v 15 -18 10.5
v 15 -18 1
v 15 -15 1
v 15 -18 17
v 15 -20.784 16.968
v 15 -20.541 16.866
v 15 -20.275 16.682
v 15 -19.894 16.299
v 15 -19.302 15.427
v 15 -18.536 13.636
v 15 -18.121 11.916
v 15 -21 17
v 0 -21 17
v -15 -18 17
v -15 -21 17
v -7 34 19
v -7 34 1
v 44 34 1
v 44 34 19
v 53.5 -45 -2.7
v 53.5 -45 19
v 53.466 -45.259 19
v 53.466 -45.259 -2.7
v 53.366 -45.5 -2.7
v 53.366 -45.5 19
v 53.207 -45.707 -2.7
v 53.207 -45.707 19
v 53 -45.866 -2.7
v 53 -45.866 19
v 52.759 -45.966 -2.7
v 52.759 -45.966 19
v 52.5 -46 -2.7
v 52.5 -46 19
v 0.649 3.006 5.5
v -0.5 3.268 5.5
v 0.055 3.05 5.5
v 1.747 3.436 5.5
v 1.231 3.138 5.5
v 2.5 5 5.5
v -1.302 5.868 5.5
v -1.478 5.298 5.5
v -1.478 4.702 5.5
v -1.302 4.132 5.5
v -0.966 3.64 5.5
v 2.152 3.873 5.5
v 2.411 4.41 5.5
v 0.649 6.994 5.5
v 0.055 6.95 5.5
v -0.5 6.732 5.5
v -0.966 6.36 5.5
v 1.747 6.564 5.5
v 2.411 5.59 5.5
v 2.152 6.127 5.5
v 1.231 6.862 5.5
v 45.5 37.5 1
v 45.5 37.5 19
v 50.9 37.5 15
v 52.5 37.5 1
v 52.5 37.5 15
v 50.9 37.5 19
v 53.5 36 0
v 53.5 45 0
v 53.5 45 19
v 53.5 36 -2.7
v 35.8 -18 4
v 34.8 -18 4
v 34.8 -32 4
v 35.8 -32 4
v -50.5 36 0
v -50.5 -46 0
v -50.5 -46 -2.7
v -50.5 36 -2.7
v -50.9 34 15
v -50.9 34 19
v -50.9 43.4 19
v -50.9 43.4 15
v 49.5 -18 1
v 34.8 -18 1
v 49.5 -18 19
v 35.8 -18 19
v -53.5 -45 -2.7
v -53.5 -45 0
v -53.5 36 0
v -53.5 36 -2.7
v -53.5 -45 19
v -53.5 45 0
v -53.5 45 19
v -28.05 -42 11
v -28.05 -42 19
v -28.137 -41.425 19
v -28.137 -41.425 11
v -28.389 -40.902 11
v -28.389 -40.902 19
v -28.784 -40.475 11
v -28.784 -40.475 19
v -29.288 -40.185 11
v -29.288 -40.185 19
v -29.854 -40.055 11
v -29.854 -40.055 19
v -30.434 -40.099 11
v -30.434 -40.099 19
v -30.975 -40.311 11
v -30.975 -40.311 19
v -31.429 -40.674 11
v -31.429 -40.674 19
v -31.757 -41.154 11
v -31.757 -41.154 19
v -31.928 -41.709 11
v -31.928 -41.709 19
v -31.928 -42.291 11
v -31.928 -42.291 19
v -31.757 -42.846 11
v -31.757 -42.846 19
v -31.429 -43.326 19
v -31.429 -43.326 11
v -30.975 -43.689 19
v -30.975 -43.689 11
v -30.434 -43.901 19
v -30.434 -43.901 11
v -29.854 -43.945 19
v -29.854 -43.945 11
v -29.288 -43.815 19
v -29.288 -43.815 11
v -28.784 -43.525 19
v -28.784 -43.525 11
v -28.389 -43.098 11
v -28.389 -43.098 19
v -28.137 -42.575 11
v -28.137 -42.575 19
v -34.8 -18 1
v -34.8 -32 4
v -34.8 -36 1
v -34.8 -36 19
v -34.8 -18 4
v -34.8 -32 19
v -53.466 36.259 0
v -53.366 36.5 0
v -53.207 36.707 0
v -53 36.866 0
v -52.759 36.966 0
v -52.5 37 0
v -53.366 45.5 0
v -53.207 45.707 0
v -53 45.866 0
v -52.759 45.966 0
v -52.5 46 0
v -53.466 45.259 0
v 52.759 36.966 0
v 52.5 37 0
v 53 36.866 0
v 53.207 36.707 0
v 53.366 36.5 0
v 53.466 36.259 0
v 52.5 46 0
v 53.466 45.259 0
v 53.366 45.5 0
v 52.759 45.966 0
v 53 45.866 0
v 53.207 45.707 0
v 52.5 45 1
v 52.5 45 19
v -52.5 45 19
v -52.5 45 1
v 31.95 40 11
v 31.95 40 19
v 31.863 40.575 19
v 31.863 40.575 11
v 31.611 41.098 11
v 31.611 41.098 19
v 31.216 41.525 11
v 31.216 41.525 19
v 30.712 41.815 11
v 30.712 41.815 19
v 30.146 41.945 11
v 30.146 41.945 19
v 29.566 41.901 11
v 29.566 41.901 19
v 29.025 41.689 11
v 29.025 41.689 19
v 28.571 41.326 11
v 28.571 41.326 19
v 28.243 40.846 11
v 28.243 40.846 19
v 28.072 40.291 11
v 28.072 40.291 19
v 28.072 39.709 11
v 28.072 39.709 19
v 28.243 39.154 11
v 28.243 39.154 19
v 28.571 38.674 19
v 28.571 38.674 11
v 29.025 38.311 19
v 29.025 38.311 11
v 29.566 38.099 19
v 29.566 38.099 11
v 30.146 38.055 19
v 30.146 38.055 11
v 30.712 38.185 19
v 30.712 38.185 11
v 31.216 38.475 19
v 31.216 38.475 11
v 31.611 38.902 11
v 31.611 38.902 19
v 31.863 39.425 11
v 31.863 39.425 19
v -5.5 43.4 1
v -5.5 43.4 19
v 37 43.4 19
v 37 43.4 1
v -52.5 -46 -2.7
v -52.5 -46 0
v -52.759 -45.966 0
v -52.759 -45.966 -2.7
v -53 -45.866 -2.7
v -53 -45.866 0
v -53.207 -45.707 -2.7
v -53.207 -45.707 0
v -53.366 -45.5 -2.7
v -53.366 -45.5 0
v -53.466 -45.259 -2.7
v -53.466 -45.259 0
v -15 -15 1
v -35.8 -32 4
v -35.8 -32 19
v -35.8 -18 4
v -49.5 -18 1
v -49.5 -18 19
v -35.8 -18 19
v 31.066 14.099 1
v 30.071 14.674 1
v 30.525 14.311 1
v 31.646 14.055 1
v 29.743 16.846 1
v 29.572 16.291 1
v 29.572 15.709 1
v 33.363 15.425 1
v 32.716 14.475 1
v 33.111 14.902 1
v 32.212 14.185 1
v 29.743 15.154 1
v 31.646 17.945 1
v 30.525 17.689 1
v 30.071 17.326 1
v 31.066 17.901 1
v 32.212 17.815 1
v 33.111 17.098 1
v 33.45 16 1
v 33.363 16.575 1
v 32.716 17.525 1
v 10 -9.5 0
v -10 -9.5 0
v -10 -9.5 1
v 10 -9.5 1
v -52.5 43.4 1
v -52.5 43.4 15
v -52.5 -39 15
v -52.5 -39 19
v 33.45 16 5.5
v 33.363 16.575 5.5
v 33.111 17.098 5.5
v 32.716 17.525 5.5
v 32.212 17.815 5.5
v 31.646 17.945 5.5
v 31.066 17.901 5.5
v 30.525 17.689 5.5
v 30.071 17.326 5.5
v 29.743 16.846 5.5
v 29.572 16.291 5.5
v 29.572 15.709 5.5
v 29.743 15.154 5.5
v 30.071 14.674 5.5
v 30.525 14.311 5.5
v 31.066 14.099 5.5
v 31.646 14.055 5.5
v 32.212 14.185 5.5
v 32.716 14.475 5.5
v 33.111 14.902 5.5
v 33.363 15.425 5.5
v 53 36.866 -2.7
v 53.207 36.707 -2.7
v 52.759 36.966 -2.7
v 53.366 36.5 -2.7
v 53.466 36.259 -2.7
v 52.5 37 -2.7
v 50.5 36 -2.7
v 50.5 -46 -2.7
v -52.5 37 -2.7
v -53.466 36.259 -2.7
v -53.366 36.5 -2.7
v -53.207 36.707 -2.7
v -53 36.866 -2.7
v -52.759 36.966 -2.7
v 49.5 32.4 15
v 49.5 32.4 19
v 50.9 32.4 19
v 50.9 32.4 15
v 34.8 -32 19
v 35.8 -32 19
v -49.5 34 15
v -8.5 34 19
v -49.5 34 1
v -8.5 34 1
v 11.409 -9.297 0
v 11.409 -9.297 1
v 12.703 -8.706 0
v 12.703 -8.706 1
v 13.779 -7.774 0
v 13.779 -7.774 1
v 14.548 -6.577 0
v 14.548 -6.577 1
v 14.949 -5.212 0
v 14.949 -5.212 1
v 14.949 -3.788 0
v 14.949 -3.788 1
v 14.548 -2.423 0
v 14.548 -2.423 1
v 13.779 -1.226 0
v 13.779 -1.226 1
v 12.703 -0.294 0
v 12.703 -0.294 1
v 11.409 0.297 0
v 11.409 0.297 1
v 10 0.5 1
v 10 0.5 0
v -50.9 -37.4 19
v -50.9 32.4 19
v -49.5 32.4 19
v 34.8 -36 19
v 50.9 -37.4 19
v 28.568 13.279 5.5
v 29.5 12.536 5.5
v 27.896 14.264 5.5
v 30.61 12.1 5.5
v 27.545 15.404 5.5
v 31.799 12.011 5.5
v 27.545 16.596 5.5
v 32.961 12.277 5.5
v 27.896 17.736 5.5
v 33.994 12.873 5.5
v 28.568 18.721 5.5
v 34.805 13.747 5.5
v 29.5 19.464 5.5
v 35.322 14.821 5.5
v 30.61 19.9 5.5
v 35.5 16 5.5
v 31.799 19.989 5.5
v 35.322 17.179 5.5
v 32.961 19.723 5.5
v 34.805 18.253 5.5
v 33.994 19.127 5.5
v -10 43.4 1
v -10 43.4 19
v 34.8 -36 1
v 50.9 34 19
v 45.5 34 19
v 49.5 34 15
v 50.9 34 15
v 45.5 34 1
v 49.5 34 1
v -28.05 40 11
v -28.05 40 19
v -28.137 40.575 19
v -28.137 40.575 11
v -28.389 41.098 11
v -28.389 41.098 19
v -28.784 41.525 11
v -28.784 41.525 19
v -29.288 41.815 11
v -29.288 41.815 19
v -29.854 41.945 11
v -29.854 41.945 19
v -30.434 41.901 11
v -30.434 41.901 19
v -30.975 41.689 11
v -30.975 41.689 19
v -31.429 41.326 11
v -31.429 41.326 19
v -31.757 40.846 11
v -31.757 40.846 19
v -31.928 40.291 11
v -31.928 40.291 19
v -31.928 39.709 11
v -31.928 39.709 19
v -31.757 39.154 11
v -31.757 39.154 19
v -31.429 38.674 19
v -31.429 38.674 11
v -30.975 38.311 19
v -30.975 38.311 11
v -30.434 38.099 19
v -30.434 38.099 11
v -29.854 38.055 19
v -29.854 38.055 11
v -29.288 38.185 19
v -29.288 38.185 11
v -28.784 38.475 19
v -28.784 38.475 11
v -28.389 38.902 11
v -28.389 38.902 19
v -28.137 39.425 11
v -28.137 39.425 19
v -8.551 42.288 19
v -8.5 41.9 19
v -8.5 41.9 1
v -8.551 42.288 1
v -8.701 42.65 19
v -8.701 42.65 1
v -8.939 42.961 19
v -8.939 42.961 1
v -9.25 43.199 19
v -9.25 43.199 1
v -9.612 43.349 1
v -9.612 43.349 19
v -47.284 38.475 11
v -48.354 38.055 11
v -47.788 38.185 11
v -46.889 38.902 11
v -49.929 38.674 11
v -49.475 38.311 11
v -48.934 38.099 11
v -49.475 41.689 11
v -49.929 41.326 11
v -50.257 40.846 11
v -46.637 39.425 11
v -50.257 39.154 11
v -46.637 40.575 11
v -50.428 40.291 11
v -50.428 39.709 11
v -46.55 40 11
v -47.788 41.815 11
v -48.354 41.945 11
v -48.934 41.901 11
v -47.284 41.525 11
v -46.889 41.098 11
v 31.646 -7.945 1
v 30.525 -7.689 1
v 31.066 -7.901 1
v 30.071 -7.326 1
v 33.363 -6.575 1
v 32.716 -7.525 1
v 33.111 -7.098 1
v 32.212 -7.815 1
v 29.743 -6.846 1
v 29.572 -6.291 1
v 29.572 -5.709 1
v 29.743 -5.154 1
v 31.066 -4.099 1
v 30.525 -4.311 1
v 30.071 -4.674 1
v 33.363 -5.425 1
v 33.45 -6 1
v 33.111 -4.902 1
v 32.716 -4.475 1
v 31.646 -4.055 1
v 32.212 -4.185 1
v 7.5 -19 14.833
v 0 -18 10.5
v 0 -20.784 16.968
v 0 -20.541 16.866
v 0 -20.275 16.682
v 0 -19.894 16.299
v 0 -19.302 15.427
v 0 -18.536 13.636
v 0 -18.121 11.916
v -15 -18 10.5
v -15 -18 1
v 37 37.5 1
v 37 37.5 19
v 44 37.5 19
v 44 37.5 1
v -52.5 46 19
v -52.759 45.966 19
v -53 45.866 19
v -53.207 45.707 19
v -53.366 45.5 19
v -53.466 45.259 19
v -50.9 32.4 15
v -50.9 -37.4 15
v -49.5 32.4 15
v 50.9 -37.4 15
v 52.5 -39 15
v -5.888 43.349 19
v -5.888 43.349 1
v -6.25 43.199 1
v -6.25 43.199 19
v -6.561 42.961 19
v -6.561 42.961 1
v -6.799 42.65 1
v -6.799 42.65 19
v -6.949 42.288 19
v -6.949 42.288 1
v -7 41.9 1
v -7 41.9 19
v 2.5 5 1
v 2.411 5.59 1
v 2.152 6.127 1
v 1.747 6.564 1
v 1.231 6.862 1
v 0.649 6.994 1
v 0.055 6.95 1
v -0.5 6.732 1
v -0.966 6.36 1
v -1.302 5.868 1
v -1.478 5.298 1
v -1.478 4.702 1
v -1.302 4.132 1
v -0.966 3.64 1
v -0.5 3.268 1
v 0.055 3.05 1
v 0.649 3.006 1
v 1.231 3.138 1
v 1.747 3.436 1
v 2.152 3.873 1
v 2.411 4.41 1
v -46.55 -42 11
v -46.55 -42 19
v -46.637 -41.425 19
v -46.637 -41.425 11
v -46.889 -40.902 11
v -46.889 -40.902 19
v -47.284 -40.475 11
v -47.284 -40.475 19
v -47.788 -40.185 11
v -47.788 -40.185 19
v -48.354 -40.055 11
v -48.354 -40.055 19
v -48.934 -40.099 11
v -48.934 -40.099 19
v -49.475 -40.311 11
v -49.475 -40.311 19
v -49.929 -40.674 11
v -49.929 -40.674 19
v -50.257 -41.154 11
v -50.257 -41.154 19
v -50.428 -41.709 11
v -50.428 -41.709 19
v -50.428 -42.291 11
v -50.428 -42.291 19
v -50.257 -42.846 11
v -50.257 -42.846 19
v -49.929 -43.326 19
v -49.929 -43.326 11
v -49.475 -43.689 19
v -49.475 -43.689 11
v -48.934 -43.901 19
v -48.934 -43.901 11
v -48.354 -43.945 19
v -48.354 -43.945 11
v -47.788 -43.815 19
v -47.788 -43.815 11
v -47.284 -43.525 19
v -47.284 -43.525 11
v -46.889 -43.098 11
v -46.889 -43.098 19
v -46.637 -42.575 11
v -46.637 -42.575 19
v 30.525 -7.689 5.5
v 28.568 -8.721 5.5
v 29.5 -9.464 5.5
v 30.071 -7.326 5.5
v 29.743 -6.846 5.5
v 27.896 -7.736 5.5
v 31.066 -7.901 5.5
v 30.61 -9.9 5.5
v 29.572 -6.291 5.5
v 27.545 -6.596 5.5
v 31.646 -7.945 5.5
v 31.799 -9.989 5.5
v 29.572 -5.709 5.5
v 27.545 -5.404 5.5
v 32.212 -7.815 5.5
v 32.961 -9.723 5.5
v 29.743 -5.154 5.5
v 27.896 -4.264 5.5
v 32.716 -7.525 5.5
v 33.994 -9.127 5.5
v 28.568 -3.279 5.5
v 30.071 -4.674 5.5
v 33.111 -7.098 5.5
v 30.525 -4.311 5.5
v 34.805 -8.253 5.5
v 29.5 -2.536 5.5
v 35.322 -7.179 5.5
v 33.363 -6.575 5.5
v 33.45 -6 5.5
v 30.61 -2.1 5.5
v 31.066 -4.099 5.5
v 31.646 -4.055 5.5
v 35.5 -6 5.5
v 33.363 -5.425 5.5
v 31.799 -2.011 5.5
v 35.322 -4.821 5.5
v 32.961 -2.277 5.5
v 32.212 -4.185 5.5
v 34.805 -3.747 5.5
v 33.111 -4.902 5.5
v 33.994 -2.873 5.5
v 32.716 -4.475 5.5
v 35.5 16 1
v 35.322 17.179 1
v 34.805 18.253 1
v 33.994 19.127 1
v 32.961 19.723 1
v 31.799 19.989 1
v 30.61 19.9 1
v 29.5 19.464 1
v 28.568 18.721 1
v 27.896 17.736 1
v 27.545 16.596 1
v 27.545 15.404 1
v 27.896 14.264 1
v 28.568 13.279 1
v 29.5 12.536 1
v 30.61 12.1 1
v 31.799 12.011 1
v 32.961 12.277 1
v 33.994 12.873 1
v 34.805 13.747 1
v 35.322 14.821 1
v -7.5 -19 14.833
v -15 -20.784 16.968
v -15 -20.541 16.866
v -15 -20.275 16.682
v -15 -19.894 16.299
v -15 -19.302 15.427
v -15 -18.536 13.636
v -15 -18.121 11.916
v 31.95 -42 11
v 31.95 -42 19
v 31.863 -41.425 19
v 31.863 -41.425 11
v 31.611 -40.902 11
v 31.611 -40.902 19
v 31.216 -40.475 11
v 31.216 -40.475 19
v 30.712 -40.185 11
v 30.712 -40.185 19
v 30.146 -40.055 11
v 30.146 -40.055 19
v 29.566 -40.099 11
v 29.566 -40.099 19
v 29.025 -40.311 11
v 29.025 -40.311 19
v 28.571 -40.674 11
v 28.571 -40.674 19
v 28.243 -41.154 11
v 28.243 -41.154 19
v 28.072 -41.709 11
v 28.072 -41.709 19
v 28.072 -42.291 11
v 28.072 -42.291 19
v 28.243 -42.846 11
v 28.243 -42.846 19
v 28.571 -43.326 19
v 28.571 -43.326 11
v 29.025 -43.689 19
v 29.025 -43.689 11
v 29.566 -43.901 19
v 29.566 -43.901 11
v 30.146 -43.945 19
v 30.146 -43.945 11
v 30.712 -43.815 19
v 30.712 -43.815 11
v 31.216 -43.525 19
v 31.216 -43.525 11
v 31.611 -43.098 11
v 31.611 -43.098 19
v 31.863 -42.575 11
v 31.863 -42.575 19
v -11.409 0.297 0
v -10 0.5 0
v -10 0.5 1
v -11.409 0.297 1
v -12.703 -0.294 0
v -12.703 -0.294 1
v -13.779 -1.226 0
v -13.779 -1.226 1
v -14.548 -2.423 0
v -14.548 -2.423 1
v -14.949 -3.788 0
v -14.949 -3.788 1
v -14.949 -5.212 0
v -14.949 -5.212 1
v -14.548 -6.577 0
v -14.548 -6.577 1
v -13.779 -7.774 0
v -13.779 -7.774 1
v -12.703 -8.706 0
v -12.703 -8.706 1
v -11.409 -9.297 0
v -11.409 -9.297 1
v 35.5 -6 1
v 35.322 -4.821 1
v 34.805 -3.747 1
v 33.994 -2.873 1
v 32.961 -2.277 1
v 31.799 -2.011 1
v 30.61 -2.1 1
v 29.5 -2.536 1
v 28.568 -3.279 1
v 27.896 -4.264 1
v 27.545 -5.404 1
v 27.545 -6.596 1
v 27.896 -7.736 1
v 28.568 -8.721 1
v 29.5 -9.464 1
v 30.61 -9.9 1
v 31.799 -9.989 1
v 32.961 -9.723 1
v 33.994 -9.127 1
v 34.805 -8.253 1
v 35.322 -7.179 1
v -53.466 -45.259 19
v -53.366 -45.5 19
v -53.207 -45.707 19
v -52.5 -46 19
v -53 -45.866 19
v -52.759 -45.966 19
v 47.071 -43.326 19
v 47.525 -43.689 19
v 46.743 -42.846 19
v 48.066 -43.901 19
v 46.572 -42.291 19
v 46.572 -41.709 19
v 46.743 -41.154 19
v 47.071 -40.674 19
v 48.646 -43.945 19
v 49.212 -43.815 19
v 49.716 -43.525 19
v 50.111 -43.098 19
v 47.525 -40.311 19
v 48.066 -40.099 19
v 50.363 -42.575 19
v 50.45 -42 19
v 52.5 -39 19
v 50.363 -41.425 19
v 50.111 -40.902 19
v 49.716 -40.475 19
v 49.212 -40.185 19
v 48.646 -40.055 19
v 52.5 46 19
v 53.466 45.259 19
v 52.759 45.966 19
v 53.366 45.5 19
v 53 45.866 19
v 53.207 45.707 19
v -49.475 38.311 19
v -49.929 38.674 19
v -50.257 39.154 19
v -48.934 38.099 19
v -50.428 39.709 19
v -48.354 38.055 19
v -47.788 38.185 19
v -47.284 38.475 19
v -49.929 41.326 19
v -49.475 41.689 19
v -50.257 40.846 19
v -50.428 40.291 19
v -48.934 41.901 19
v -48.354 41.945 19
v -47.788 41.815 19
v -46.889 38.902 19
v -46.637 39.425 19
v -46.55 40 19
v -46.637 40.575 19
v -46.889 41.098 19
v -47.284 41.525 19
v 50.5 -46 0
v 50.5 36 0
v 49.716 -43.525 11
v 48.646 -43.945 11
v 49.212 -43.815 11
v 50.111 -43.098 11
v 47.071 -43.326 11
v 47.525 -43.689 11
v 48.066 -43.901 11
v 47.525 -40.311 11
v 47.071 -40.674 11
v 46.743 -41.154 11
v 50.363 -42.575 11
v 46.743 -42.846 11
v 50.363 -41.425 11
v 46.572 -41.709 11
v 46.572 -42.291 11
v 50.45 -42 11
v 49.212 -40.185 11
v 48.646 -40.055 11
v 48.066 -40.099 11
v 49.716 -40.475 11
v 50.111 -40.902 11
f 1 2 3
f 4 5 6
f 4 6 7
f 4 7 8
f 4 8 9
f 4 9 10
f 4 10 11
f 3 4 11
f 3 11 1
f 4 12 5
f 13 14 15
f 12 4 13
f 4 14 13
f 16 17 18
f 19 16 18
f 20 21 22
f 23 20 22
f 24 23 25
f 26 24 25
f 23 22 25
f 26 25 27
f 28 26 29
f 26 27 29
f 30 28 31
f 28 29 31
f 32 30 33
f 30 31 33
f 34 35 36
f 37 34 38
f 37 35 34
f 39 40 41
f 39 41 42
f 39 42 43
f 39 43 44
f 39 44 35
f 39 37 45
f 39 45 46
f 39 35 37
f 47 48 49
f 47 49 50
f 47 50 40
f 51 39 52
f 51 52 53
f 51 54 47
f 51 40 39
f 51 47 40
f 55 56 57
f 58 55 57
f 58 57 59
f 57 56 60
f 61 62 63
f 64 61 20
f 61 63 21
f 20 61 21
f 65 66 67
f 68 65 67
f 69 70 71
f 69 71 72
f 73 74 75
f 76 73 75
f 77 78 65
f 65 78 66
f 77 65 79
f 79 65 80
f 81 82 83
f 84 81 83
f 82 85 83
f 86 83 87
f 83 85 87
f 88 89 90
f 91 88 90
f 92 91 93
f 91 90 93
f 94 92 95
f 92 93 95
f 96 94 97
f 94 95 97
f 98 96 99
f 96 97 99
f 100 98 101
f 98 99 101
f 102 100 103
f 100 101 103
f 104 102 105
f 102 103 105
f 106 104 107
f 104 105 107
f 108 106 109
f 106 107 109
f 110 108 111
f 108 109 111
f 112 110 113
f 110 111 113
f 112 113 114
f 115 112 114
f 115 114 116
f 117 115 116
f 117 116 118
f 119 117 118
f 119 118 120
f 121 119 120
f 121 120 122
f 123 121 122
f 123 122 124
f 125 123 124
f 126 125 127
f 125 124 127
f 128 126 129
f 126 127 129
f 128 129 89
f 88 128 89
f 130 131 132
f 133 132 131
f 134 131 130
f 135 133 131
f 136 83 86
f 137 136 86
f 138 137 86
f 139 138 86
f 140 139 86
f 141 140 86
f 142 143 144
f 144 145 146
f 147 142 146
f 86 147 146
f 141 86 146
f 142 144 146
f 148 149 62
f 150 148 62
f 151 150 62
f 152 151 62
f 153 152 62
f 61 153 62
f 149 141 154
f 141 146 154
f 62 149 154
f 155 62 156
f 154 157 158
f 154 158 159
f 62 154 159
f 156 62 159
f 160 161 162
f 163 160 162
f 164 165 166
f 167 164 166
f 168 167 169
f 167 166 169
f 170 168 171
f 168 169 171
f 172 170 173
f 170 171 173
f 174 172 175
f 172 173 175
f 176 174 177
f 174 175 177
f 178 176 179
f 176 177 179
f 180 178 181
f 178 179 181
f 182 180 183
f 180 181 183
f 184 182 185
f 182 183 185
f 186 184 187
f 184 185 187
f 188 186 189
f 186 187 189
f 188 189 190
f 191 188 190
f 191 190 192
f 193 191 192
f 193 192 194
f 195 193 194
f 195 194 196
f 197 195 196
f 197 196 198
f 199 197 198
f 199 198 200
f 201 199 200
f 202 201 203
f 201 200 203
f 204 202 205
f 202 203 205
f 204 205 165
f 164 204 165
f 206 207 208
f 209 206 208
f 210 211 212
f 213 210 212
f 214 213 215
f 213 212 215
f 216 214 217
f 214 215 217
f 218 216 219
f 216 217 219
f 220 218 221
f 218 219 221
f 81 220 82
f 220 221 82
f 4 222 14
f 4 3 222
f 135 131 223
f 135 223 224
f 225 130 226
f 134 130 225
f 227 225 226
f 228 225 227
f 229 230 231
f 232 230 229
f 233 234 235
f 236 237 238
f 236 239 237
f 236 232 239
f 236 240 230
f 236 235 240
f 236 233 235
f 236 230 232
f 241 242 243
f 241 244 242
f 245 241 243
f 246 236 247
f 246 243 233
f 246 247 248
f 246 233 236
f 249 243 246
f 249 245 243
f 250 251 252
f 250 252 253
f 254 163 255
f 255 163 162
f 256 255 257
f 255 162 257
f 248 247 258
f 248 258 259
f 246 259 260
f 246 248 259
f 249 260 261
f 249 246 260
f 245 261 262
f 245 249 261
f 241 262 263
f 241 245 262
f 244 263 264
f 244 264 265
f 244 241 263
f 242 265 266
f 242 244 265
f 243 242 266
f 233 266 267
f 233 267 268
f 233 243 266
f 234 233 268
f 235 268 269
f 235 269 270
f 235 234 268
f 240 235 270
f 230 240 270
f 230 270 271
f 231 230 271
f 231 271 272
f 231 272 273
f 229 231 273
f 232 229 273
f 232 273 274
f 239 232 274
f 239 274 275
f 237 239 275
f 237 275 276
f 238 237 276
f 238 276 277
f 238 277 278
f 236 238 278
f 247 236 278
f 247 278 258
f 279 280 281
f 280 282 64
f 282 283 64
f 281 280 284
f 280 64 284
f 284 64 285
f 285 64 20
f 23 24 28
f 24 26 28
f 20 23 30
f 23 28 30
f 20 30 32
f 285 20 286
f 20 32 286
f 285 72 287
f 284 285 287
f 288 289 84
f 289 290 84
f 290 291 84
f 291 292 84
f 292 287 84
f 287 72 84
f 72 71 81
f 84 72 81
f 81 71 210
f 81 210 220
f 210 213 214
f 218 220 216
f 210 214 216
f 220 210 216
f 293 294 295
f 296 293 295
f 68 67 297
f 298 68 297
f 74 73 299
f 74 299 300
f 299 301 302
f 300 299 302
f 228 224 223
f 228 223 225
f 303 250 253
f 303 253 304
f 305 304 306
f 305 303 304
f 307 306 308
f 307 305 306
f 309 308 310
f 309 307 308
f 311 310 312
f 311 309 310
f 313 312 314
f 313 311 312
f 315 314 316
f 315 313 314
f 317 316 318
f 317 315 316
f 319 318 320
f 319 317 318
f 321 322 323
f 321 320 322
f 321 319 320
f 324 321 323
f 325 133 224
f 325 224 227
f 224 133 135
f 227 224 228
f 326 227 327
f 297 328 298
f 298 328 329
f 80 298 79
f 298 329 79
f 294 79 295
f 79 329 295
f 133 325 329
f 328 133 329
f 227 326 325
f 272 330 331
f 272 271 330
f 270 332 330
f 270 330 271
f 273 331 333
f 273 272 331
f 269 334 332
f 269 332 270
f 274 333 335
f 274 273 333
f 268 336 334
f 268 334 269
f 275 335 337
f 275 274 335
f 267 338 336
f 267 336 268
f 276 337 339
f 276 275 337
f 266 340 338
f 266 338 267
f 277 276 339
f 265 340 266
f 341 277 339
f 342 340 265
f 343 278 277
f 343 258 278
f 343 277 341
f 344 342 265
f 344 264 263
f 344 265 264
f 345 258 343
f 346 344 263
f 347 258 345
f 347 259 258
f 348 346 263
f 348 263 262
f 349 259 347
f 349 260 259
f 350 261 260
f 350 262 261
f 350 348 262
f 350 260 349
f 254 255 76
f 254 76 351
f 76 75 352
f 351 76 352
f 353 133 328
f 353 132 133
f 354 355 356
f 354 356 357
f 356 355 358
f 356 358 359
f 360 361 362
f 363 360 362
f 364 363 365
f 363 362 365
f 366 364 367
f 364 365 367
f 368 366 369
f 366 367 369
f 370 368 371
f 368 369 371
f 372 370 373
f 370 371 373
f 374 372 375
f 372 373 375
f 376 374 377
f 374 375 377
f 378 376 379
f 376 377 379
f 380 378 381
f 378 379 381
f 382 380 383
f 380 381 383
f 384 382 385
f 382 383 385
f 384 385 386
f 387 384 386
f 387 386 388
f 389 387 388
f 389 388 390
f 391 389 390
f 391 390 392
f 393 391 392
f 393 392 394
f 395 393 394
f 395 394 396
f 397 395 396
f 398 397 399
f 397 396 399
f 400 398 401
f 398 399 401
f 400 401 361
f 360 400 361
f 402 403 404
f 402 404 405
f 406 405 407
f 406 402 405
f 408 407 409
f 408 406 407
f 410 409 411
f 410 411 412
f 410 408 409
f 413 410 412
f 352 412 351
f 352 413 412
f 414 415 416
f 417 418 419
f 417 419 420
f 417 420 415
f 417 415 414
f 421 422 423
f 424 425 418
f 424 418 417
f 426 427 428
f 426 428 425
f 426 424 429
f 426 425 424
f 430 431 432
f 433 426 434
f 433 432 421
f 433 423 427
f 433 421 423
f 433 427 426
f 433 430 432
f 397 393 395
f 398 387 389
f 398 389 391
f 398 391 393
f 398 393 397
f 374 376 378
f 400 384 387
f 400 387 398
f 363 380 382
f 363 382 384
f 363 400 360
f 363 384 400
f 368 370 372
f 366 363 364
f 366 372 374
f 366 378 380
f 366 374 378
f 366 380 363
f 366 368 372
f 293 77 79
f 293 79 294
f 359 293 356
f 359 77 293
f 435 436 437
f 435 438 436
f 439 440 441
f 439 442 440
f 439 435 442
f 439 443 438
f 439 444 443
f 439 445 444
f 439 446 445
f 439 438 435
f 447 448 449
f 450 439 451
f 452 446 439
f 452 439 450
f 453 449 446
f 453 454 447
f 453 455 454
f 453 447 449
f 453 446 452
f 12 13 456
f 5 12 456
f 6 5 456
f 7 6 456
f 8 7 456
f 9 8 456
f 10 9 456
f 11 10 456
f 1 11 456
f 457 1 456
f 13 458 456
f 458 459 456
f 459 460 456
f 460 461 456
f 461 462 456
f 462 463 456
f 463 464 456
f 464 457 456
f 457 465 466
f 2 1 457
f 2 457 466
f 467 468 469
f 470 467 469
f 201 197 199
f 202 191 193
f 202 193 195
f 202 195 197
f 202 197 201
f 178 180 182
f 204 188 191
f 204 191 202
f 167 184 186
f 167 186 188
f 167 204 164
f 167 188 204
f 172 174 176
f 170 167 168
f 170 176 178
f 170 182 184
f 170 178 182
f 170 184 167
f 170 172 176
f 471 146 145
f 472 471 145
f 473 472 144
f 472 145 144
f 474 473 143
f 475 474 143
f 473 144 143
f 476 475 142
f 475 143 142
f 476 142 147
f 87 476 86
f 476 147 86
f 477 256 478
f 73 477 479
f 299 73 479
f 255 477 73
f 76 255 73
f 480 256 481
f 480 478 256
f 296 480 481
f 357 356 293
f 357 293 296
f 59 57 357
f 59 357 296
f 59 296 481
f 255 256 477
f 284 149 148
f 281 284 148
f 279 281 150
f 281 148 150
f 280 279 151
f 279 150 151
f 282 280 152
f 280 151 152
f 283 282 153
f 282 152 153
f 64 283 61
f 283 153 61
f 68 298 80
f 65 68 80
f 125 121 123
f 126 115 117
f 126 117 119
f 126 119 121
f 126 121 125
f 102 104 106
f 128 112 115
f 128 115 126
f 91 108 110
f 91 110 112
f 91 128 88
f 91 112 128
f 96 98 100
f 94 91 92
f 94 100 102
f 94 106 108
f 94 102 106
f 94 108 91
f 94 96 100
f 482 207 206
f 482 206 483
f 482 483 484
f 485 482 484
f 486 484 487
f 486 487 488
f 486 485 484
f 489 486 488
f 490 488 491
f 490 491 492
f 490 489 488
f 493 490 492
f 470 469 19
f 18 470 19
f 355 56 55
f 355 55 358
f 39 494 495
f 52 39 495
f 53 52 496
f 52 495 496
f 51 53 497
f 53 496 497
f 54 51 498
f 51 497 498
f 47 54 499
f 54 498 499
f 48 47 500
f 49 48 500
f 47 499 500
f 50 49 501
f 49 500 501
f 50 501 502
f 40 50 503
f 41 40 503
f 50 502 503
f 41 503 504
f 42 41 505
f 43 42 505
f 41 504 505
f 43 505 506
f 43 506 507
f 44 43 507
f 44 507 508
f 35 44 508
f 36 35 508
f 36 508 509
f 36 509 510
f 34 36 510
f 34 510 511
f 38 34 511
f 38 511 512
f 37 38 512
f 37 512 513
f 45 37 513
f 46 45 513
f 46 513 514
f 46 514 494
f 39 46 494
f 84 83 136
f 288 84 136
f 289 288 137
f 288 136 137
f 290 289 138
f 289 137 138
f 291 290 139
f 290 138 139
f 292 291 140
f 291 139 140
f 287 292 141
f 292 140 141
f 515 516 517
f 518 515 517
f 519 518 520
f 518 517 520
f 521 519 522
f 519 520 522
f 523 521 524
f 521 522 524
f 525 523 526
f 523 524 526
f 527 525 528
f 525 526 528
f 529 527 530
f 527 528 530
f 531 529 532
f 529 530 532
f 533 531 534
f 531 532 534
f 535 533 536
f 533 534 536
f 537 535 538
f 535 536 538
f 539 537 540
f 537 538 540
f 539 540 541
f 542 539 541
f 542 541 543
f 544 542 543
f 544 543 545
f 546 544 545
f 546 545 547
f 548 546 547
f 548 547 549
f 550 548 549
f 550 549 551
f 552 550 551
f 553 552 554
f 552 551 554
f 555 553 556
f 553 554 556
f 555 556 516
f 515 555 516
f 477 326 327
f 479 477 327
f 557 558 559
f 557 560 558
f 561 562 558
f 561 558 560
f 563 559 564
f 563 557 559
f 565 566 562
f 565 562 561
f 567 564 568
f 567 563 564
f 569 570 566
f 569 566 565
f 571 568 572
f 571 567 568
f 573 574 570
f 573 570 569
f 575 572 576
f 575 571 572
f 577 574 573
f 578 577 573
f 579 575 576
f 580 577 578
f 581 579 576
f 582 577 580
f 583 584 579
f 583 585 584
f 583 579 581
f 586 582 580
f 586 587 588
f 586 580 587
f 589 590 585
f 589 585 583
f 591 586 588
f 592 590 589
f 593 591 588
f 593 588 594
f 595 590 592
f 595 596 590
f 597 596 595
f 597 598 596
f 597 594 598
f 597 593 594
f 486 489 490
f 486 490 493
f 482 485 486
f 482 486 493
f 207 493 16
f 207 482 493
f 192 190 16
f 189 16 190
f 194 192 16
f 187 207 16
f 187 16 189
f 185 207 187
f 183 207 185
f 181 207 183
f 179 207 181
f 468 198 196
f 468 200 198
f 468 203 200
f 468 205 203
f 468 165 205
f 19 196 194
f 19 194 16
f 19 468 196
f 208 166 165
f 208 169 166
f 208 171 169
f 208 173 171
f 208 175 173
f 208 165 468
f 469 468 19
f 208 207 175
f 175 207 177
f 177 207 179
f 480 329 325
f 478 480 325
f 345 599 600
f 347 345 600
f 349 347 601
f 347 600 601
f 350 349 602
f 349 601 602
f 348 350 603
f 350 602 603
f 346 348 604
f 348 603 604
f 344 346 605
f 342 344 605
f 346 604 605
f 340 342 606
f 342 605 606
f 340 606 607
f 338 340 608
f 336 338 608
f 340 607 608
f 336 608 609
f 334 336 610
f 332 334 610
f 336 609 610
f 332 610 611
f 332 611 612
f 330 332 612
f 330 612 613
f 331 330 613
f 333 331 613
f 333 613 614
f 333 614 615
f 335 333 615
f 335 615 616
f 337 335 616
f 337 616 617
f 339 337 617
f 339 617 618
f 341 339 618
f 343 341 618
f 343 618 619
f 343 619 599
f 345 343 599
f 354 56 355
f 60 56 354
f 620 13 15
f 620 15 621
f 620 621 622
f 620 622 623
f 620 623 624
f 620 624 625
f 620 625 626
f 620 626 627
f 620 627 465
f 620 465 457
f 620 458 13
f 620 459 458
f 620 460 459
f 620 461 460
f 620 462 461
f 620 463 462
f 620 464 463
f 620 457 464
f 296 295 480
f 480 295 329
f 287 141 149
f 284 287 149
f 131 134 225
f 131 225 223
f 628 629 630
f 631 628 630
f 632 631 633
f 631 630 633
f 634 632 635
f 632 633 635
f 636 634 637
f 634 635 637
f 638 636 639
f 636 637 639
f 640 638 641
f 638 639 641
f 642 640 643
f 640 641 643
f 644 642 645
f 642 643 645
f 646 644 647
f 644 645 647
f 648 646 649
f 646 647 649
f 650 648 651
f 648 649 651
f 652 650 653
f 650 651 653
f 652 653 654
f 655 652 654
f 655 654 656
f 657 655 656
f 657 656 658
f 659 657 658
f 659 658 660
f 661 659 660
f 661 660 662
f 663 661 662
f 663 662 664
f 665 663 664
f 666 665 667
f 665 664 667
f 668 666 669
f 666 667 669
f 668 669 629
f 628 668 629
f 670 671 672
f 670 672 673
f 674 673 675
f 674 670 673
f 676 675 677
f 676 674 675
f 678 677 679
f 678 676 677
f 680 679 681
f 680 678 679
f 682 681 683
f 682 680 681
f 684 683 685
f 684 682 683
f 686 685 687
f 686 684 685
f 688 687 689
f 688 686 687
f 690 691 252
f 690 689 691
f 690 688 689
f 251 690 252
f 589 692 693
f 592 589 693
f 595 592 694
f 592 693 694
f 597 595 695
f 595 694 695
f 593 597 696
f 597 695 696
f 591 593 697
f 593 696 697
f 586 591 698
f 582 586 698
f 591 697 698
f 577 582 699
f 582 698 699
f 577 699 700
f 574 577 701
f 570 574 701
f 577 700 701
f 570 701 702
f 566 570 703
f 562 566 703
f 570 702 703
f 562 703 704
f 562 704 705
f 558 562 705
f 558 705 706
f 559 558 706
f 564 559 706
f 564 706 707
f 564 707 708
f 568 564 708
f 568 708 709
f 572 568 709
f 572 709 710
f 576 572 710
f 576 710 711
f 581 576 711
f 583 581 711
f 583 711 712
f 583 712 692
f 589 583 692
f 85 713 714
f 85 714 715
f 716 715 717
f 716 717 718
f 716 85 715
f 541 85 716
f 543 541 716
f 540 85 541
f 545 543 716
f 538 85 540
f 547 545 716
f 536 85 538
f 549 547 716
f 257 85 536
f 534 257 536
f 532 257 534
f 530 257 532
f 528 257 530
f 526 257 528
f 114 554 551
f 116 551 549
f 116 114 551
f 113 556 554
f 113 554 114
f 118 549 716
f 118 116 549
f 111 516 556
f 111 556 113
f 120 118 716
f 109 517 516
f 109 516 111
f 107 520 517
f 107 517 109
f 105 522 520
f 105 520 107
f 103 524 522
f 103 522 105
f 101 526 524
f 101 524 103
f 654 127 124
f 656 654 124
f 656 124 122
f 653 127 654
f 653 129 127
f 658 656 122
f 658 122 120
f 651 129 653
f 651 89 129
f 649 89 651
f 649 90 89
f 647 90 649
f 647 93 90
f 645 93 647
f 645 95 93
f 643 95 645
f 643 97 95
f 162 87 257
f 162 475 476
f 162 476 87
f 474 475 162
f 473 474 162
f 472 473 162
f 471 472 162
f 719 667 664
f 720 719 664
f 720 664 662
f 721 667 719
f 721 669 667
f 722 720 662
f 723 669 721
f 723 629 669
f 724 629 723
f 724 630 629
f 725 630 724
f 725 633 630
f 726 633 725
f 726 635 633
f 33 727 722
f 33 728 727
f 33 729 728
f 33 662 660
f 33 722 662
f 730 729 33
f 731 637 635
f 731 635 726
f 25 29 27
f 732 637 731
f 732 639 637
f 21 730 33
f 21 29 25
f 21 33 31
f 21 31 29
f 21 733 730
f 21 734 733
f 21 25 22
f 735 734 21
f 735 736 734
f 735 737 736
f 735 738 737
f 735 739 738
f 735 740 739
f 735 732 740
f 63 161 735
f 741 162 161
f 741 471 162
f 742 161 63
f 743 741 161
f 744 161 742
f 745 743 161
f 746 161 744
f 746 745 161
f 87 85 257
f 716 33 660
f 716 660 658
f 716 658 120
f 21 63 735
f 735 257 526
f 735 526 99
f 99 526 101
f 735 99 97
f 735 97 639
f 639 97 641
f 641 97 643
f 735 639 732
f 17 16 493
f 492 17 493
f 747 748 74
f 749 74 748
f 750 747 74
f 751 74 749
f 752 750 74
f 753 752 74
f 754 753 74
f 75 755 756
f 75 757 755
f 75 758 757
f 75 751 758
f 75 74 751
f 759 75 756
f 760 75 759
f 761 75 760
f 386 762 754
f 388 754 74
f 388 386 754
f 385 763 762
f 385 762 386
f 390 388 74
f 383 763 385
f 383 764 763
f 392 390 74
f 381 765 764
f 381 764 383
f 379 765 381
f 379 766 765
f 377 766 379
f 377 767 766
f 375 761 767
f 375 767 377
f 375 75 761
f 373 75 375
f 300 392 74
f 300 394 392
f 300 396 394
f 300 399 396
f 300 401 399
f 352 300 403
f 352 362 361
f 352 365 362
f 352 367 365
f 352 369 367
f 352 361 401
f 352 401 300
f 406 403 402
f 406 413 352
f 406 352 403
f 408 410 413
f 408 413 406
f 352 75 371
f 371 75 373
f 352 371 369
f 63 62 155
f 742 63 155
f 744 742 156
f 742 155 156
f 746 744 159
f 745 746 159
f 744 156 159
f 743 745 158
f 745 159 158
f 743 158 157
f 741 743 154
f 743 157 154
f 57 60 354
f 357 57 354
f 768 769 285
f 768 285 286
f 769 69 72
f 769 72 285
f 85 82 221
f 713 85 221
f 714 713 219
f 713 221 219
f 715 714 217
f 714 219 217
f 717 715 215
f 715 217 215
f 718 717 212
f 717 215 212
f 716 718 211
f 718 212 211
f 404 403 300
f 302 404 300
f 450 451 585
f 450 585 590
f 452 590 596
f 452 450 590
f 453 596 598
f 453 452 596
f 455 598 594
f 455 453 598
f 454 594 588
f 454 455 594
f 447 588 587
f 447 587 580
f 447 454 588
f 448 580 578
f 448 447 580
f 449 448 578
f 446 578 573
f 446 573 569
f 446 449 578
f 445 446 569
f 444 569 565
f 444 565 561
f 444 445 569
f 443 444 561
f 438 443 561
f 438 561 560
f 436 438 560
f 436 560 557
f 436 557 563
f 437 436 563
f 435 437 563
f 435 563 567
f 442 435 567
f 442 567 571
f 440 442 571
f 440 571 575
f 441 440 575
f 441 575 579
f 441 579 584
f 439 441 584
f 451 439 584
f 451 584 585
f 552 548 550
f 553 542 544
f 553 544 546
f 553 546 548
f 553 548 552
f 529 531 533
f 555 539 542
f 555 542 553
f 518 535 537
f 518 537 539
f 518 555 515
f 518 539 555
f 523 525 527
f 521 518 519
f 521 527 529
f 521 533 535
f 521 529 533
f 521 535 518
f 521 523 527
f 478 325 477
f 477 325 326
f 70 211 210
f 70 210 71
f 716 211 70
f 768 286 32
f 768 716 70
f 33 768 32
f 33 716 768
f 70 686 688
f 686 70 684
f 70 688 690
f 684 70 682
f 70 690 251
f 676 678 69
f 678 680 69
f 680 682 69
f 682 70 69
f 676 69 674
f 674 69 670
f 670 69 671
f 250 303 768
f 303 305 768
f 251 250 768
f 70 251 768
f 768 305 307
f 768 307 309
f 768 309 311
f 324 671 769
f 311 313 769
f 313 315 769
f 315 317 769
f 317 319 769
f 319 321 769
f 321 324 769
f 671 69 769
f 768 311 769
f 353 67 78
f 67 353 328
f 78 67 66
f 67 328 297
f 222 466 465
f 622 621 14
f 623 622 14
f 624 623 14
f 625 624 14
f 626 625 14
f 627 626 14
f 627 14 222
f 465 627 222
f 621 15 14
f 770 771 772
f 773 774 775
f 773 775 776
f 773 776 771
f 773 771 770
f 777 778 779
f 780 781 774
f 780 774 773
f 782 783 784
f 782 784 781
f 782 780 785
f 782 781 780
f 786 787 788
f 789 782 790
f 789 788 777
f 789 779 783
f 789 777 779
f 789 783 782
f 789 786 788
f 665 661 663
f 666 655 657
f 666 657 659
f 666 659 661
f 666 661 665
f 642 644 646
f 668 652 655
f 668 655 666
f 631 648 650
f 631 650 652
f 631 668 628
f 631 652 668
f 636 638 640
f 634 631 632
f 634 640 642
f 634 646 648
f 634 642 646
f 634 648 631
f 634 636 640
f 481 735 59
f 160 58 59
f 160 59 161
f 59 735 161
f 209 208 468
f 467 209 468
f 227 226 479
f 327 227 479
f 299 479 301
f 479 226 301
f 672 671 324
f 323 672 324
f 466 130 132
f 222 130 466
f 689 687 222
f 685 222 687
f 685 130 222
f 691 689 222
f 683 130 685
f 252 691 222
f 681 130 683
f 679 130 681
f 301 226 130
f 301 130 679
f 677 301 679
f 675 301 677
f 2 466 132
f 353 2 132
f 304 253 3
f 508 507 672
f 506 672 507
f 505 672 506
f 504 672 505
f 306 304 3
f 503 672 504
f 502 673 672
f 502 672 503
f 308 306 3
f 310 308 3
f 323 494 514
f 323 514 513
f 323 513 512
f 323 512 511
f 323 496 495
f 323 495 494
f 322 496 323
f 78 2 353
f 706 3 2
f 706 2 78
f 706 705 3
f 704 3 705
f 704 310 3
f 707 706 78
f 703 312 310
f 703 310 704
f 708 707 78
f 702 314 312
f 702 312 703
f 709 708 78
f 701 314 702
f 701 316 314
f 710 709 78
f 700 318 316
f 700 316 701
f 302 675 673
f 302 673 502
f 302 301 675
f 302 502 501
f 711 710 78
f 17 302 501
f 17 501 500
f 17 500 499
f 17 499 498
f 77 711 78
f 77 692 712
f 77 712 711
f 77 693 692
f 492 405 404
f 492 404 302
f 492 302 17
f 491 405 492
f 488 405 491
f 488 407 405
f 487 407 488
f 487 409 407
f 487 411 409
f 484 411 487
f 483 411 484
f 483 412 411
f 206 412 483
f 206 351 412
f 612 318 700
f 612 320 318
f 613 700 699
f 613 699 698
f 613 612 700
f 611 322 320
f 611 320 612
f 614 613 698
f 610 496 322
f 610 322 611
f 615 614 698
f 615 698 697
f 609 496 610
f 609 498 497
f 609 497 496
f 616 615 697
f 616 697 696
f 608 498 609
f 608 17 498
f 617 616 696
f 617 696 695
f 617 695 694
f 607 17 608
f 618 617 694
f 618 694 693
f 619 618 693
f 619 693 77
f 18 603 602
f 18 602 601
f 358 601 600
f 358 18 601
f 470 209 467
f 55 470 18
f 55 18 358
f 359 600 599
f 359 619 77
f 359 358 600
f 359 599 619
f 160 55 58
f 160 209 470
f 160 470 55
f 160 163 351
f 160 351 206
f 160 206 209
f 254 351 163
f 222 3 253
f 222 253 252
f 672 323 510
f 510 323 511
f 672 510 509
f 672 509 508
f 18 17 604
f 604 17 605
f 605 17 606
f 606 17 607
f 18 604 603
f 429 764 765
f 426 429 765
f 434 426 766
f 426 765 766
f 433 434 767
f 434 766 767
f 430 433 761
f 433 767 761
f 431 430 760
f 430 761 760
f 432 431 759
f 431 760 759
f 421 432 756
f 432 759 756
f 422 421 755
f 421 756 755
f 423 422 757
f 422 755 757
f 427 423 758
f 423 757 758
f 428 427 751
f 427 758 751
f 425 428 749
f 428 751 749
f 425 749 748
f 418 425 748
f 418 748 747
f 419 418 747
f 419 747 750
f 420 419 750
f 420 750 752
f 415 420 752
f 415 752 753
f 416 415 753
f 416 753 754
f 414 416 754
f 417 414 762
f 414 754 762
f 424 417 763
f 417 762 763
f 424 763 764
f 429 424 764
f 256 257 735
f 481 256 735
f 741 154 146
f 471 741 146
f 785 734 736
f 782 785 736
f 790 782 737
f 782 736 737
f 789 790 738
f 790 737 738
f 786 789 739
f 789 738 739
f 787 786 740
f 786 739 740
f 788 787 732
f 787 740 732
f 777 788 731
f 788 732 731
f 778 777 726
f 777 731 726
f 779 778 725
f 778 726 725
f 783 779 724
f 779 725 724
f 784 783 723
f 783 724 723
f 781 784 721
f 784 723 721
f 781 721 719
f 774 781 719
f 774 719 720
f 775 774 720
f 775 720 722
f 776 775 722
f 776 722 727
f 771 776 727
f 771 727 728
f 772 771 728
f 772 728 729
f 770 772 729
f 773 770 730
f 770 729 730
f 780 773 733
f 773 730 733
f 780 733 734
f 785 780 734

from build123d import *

# Parameters (mm, degrees)
PAD011_DEPTH      = 1
SKETCH020_W       = 99
SKETCH020_H       = 70
PAD012_DEPTH      = 19
POCKET008_DEPTH   = 18
SKETCH023_R       = 4
SKETCH023_R_2     = 1.95
SKETCH023_R_3     = 2
PAD013_DEPTH      = 5.5
SKETCH024_R       = 1.95
POCKET010_DEPTH   = 8
PAD017_DEPTH      = 2.7
POCKET013_DEPTH   = 19
POCKET020_DEPTH   = 4
PAD033_START      = 34.8
PAD033_DEPTH      = 1
PAD034_START      = -34.8
PAD034_DEPTH      = 1
PAD035_START      = -35.8
SKETCH060_W       = 18
SKETCH060_H       = 18
PAD035_DEPTH      = 14
PAD036_START      = 35.8
PAD036_DEPTH      = 14
PAD037_DEPTH      = 15
PAD037_DEPTH_BACK = 15


with BuildPart() as part:
    # Sketch019 → Pad011 (new body)
    with BuildSketch(Plane.XY):
        with BuildLine():
            Line((-53.5, 45), (-53.5, -45))
            ThreePointArc((-53.5, -45), (-53.207107, -45.707107), (-52.5, -46))
            Line((-52.5, -46), (52.5, -46))
            ThreePointArc((52.5, -46), (53.207107, -45.707107), (53.5, -45))
            Line((53.5, -45), (53.5, 45))
            ThreePointArc((53.5, 45), (53.207107, 45.707107), (52.5, 46))
            Line((52.5, 46), (-52.5, 46))
            ThreePointArc((-52.5, 46), (-53.207107, 45.707107), (-53.5, 45))
        make_face()
    extrude(amount=PAD011_DEPTH)

    # Sketch020 → Pad012 (join)
    with BuildSketch(Plane.XY):
        with BuildLine():
            Line((-53.5, 45), (-53.5, -45))
            ThreePointArc((-53.5, -45), (-53.207107, -45.707107), (-52.5, -46))
            Line((-52.5, -46), (52.5, -46))
            ThreePointArc((52.5, -46), (53.207107, -45.707107), (53.5, -45))
            Line((53.5, -45), (53.5, 45))
            ThreePointArc((53.5, 45), (53.207107, 45.707107), (52.5, 46))
            Line((52.5, 46), (-52.5, 46))
            ThreePointArc((-52.5, 46), (-53.207107, 45.707107), (-53.5, 45))
        make_face()
        with Locations((0, -1)):
            Rectangle(SKETCH020_W, SKETCH020_H, mode=Mode.SUBTRACT)
    extrude(amount=PAD012_DEPTH)

    # Sketch021 (on Face14 of Pad012) → Pocket008 (cut)
    with BuildSketch(Plane.XY.offset(19)):
        with BuildLine():
            Line((-52.5, 45), (-52.5, 43.4))
            Line((-52.5, 43.4), (-10, 43.4))
            ThreePointArc((-8.5, 41.9), (-8.93934, 42.96066), (-10, 43.4))
            Line((-8.5, 41.9), (-8.5, 34))
            Line((-8.5, 34), (-7, 34))
            Line((-7, 34), (-7, 41.9))
            ThreePointArc((-5.5, 43.4), (-6.56066, 42.96066), (-7, 41.9))
            Line((-5.5, 43.4), (37, 43.4))
            Line((37, 43.4), (37, 37.5))
            Line((37, 37.5), (44, 37.5))
            Line((44, 37.5), (44, 34))
            Line((45.5, 34), (44, 34))
            Line((45.5, 37.5), (45.5, 34))
            Line((45.5, 37.5), (52.5, 37.5))
            Line((52.5, 45), (52.5, 37.5))
            Line((52.5, 45), (-52.5, 45))
        make_face()
    extrude(amount=-POCKET008_DEPTH, mode=Mode.SUBTRACT)

    # Sketch023 → Pad013 (join)
    with BuildSketch(Plane.XY):
        with Locations((31.5, 16)):
            Circle(SKETCH023_R)
        with Locations((31.5, 16)):
            Circle(SKETCH023_R_2, mode=Mode.SUBTRACT)
        with Locations((31.5, -6)):
            Circle(SKETCH023_R)
        with Locations((31.5, -6)):
            Circle(SKETCH023_R_2, mode=Mode.SUBTRACT)
        with Locations((0.5, 5)):
            Circle(SKETCH023_R_3)
    extrude(amount=PAD013_DEPTH)

    # Sketch024 (on Face14 of Pad013) → Pocket010 (cut)
    with BuildSketch(Plane.XY.offset(19)):
        with Locations((-48.5, -42)):
            Circle(SKETCH024_R)
        with Locations((-30, -42)):
            Circle(SKETCH024_R)
        with Locations((30, -42)):
            Circle(SKETCH024_R)
        with Locations((-48.5, 40)):
            Circle(SKETCH024_R)
        with Locations((-30, 40)):
            Circle(SKETCH024_R)
        with Locations((30, 40)):
            Circle(SKETCH024_R)
        with Locations((48.5, -42)):
            Circle(SKETCH024_R)
    extrude(amount=-POCKET010_DEPTH, mode=Mode.SUBTRACT)

    # Sketch025 (on Face4 of Pocket010) → Pad017 (join)
    with BuildSketch(Plane(origin=(0, 0, 0), x_dir=(1, 0, 0), z_dir=(0, 0, -1))):
        with BuildLine():
            Line((-50.500005, -36), (50.499995, -36))
            Line((50.499995, -36), (50.499995, 46))
            Line((52.5, 46), (50.499995, 46))
            ThreePointArc((53.5, 45), (53.207107, 45.707107), (52.5, 46))
            Line((53.5, -36), (53.5, 45))
            ThreePointArc((52.5, -37), (53.207107, -36.707107), (53.5, -36))
            Line((-52.5, -37), (52.5, -37))
            ThreePointArc((-53.5, -36), (-53.207107, -36.707107), (-52.5, -37))
            Line((-53.5, 45), (-53.5, -36))
            ThreePointArc((-52.500009, 46), (-53.20711, 45.707104), (-53.5, 45))
            Line((-52.500009, 46), (-50.500005, 46))
            Line((-50.500005, 46), (-50.500005, -36))
        make_face()
    extrude(amount=PAD017_DEPTH)

    # Sketch026 → Pocket013 (cut)
    with BuildSketch(Plane.XY):
        with BuildLine():
            ThreePointArc((-10, 0.5), (-15, -4.5), (-10, -9.5))
            Line((-10, -9.5), (10, -9.5))
            ThreePointArc((10, -9.5), (15, -4.5), (10, 0.5))
            Line((-10, 0.5), (10, 0.5))
        make_face()
    extrude(amount=POCKET013_DEPTH, mode=Mode.SUBTRACT)

    # Sketch053 (on Face18 of Pocket013) → Pocket020 (cut)
    with BuildSketch(Plane.XY.offset(19)):
        Polygon((-52.5, 43.4), (-52.5, -39), (52.5, -39), (52.5, 37.5), (50.9, 37.5), (50.9, 34), (47.9, 34), (47.9, 32.4), (50.9, 32.4), (50.9, -37.4), (-50.9, -37.4), (-50.9, 32.4), (-47.9, 32.4), (-47.9, 34), (-50.9, 34), (-50.9, 43.4), align=None)
    extrude(amount=-POCKET020_DEPTH, mode=Mode.SUBTRACT)

    # Sketch059 → Pad033 (join)
    with BuildSketch(Plane.YZ.offset(PAD033_START)):
        Polygon((-36, 19), (-36, 1), (-18, 1), (-18, 4), (-32, 4), (-32, 19), align=None)
    extrude(amount=PAD033_DEPTH)

    # Sketch059 → Pad034 (join)
    with BuildSketch(Plane.YZ.offset(PAD034_START)):
        Polygon((-36, 19), (-36, 1), (-18, 1), (-18, 4), (-32, 4), (-32, 19), align=None)
    extrude(amount=-PAD034_DEPTH)

    # Sketch060 → Pad035 (join)
    with BuildSketch(Plane.YZ.offset(PAD035_START)):
        with Locations((-27, 10)):
            Rectangle(SKETCH060_W, SKETCH060_H)
    extrude(amount=-PAD035_DEPTH)

    # Sketch060 → Pad036 (join)
    with BuildSketch(Plane.YZ.offset(PAD036_START)):
        with Locations((-27, 10)):
            Rectangle(SKETCH060_W, SKETCH060_H)
    extrude(amount=PAD036_DEPTH)

    # Sketch056 → Pad037 (join, two sides)
    with BuildSketch(Plane.YZ) as pad037_sk:
        with BuildLine():
            add(Edge.make_bspline(
                [(-21, 17), (-18, 17), (-18, 10.5)],
                knots=[0, 0, 0, 1, 1, 1], degree=2, weights=[1, 0.5, 1]))
            Line((-18, 10.5), (-18, 1))
            Line((-18, 1), (-15, 1))
            Line((-15, 1), (-18, 17))
            Line((-18, 17), (-21, 17))
        make_face()
    extrude(amount=PAD037_DEPTH)
    extrude(pad037_sk.sketch, amount=-PAD037_DEPTH_BACK)


solid = part.part
